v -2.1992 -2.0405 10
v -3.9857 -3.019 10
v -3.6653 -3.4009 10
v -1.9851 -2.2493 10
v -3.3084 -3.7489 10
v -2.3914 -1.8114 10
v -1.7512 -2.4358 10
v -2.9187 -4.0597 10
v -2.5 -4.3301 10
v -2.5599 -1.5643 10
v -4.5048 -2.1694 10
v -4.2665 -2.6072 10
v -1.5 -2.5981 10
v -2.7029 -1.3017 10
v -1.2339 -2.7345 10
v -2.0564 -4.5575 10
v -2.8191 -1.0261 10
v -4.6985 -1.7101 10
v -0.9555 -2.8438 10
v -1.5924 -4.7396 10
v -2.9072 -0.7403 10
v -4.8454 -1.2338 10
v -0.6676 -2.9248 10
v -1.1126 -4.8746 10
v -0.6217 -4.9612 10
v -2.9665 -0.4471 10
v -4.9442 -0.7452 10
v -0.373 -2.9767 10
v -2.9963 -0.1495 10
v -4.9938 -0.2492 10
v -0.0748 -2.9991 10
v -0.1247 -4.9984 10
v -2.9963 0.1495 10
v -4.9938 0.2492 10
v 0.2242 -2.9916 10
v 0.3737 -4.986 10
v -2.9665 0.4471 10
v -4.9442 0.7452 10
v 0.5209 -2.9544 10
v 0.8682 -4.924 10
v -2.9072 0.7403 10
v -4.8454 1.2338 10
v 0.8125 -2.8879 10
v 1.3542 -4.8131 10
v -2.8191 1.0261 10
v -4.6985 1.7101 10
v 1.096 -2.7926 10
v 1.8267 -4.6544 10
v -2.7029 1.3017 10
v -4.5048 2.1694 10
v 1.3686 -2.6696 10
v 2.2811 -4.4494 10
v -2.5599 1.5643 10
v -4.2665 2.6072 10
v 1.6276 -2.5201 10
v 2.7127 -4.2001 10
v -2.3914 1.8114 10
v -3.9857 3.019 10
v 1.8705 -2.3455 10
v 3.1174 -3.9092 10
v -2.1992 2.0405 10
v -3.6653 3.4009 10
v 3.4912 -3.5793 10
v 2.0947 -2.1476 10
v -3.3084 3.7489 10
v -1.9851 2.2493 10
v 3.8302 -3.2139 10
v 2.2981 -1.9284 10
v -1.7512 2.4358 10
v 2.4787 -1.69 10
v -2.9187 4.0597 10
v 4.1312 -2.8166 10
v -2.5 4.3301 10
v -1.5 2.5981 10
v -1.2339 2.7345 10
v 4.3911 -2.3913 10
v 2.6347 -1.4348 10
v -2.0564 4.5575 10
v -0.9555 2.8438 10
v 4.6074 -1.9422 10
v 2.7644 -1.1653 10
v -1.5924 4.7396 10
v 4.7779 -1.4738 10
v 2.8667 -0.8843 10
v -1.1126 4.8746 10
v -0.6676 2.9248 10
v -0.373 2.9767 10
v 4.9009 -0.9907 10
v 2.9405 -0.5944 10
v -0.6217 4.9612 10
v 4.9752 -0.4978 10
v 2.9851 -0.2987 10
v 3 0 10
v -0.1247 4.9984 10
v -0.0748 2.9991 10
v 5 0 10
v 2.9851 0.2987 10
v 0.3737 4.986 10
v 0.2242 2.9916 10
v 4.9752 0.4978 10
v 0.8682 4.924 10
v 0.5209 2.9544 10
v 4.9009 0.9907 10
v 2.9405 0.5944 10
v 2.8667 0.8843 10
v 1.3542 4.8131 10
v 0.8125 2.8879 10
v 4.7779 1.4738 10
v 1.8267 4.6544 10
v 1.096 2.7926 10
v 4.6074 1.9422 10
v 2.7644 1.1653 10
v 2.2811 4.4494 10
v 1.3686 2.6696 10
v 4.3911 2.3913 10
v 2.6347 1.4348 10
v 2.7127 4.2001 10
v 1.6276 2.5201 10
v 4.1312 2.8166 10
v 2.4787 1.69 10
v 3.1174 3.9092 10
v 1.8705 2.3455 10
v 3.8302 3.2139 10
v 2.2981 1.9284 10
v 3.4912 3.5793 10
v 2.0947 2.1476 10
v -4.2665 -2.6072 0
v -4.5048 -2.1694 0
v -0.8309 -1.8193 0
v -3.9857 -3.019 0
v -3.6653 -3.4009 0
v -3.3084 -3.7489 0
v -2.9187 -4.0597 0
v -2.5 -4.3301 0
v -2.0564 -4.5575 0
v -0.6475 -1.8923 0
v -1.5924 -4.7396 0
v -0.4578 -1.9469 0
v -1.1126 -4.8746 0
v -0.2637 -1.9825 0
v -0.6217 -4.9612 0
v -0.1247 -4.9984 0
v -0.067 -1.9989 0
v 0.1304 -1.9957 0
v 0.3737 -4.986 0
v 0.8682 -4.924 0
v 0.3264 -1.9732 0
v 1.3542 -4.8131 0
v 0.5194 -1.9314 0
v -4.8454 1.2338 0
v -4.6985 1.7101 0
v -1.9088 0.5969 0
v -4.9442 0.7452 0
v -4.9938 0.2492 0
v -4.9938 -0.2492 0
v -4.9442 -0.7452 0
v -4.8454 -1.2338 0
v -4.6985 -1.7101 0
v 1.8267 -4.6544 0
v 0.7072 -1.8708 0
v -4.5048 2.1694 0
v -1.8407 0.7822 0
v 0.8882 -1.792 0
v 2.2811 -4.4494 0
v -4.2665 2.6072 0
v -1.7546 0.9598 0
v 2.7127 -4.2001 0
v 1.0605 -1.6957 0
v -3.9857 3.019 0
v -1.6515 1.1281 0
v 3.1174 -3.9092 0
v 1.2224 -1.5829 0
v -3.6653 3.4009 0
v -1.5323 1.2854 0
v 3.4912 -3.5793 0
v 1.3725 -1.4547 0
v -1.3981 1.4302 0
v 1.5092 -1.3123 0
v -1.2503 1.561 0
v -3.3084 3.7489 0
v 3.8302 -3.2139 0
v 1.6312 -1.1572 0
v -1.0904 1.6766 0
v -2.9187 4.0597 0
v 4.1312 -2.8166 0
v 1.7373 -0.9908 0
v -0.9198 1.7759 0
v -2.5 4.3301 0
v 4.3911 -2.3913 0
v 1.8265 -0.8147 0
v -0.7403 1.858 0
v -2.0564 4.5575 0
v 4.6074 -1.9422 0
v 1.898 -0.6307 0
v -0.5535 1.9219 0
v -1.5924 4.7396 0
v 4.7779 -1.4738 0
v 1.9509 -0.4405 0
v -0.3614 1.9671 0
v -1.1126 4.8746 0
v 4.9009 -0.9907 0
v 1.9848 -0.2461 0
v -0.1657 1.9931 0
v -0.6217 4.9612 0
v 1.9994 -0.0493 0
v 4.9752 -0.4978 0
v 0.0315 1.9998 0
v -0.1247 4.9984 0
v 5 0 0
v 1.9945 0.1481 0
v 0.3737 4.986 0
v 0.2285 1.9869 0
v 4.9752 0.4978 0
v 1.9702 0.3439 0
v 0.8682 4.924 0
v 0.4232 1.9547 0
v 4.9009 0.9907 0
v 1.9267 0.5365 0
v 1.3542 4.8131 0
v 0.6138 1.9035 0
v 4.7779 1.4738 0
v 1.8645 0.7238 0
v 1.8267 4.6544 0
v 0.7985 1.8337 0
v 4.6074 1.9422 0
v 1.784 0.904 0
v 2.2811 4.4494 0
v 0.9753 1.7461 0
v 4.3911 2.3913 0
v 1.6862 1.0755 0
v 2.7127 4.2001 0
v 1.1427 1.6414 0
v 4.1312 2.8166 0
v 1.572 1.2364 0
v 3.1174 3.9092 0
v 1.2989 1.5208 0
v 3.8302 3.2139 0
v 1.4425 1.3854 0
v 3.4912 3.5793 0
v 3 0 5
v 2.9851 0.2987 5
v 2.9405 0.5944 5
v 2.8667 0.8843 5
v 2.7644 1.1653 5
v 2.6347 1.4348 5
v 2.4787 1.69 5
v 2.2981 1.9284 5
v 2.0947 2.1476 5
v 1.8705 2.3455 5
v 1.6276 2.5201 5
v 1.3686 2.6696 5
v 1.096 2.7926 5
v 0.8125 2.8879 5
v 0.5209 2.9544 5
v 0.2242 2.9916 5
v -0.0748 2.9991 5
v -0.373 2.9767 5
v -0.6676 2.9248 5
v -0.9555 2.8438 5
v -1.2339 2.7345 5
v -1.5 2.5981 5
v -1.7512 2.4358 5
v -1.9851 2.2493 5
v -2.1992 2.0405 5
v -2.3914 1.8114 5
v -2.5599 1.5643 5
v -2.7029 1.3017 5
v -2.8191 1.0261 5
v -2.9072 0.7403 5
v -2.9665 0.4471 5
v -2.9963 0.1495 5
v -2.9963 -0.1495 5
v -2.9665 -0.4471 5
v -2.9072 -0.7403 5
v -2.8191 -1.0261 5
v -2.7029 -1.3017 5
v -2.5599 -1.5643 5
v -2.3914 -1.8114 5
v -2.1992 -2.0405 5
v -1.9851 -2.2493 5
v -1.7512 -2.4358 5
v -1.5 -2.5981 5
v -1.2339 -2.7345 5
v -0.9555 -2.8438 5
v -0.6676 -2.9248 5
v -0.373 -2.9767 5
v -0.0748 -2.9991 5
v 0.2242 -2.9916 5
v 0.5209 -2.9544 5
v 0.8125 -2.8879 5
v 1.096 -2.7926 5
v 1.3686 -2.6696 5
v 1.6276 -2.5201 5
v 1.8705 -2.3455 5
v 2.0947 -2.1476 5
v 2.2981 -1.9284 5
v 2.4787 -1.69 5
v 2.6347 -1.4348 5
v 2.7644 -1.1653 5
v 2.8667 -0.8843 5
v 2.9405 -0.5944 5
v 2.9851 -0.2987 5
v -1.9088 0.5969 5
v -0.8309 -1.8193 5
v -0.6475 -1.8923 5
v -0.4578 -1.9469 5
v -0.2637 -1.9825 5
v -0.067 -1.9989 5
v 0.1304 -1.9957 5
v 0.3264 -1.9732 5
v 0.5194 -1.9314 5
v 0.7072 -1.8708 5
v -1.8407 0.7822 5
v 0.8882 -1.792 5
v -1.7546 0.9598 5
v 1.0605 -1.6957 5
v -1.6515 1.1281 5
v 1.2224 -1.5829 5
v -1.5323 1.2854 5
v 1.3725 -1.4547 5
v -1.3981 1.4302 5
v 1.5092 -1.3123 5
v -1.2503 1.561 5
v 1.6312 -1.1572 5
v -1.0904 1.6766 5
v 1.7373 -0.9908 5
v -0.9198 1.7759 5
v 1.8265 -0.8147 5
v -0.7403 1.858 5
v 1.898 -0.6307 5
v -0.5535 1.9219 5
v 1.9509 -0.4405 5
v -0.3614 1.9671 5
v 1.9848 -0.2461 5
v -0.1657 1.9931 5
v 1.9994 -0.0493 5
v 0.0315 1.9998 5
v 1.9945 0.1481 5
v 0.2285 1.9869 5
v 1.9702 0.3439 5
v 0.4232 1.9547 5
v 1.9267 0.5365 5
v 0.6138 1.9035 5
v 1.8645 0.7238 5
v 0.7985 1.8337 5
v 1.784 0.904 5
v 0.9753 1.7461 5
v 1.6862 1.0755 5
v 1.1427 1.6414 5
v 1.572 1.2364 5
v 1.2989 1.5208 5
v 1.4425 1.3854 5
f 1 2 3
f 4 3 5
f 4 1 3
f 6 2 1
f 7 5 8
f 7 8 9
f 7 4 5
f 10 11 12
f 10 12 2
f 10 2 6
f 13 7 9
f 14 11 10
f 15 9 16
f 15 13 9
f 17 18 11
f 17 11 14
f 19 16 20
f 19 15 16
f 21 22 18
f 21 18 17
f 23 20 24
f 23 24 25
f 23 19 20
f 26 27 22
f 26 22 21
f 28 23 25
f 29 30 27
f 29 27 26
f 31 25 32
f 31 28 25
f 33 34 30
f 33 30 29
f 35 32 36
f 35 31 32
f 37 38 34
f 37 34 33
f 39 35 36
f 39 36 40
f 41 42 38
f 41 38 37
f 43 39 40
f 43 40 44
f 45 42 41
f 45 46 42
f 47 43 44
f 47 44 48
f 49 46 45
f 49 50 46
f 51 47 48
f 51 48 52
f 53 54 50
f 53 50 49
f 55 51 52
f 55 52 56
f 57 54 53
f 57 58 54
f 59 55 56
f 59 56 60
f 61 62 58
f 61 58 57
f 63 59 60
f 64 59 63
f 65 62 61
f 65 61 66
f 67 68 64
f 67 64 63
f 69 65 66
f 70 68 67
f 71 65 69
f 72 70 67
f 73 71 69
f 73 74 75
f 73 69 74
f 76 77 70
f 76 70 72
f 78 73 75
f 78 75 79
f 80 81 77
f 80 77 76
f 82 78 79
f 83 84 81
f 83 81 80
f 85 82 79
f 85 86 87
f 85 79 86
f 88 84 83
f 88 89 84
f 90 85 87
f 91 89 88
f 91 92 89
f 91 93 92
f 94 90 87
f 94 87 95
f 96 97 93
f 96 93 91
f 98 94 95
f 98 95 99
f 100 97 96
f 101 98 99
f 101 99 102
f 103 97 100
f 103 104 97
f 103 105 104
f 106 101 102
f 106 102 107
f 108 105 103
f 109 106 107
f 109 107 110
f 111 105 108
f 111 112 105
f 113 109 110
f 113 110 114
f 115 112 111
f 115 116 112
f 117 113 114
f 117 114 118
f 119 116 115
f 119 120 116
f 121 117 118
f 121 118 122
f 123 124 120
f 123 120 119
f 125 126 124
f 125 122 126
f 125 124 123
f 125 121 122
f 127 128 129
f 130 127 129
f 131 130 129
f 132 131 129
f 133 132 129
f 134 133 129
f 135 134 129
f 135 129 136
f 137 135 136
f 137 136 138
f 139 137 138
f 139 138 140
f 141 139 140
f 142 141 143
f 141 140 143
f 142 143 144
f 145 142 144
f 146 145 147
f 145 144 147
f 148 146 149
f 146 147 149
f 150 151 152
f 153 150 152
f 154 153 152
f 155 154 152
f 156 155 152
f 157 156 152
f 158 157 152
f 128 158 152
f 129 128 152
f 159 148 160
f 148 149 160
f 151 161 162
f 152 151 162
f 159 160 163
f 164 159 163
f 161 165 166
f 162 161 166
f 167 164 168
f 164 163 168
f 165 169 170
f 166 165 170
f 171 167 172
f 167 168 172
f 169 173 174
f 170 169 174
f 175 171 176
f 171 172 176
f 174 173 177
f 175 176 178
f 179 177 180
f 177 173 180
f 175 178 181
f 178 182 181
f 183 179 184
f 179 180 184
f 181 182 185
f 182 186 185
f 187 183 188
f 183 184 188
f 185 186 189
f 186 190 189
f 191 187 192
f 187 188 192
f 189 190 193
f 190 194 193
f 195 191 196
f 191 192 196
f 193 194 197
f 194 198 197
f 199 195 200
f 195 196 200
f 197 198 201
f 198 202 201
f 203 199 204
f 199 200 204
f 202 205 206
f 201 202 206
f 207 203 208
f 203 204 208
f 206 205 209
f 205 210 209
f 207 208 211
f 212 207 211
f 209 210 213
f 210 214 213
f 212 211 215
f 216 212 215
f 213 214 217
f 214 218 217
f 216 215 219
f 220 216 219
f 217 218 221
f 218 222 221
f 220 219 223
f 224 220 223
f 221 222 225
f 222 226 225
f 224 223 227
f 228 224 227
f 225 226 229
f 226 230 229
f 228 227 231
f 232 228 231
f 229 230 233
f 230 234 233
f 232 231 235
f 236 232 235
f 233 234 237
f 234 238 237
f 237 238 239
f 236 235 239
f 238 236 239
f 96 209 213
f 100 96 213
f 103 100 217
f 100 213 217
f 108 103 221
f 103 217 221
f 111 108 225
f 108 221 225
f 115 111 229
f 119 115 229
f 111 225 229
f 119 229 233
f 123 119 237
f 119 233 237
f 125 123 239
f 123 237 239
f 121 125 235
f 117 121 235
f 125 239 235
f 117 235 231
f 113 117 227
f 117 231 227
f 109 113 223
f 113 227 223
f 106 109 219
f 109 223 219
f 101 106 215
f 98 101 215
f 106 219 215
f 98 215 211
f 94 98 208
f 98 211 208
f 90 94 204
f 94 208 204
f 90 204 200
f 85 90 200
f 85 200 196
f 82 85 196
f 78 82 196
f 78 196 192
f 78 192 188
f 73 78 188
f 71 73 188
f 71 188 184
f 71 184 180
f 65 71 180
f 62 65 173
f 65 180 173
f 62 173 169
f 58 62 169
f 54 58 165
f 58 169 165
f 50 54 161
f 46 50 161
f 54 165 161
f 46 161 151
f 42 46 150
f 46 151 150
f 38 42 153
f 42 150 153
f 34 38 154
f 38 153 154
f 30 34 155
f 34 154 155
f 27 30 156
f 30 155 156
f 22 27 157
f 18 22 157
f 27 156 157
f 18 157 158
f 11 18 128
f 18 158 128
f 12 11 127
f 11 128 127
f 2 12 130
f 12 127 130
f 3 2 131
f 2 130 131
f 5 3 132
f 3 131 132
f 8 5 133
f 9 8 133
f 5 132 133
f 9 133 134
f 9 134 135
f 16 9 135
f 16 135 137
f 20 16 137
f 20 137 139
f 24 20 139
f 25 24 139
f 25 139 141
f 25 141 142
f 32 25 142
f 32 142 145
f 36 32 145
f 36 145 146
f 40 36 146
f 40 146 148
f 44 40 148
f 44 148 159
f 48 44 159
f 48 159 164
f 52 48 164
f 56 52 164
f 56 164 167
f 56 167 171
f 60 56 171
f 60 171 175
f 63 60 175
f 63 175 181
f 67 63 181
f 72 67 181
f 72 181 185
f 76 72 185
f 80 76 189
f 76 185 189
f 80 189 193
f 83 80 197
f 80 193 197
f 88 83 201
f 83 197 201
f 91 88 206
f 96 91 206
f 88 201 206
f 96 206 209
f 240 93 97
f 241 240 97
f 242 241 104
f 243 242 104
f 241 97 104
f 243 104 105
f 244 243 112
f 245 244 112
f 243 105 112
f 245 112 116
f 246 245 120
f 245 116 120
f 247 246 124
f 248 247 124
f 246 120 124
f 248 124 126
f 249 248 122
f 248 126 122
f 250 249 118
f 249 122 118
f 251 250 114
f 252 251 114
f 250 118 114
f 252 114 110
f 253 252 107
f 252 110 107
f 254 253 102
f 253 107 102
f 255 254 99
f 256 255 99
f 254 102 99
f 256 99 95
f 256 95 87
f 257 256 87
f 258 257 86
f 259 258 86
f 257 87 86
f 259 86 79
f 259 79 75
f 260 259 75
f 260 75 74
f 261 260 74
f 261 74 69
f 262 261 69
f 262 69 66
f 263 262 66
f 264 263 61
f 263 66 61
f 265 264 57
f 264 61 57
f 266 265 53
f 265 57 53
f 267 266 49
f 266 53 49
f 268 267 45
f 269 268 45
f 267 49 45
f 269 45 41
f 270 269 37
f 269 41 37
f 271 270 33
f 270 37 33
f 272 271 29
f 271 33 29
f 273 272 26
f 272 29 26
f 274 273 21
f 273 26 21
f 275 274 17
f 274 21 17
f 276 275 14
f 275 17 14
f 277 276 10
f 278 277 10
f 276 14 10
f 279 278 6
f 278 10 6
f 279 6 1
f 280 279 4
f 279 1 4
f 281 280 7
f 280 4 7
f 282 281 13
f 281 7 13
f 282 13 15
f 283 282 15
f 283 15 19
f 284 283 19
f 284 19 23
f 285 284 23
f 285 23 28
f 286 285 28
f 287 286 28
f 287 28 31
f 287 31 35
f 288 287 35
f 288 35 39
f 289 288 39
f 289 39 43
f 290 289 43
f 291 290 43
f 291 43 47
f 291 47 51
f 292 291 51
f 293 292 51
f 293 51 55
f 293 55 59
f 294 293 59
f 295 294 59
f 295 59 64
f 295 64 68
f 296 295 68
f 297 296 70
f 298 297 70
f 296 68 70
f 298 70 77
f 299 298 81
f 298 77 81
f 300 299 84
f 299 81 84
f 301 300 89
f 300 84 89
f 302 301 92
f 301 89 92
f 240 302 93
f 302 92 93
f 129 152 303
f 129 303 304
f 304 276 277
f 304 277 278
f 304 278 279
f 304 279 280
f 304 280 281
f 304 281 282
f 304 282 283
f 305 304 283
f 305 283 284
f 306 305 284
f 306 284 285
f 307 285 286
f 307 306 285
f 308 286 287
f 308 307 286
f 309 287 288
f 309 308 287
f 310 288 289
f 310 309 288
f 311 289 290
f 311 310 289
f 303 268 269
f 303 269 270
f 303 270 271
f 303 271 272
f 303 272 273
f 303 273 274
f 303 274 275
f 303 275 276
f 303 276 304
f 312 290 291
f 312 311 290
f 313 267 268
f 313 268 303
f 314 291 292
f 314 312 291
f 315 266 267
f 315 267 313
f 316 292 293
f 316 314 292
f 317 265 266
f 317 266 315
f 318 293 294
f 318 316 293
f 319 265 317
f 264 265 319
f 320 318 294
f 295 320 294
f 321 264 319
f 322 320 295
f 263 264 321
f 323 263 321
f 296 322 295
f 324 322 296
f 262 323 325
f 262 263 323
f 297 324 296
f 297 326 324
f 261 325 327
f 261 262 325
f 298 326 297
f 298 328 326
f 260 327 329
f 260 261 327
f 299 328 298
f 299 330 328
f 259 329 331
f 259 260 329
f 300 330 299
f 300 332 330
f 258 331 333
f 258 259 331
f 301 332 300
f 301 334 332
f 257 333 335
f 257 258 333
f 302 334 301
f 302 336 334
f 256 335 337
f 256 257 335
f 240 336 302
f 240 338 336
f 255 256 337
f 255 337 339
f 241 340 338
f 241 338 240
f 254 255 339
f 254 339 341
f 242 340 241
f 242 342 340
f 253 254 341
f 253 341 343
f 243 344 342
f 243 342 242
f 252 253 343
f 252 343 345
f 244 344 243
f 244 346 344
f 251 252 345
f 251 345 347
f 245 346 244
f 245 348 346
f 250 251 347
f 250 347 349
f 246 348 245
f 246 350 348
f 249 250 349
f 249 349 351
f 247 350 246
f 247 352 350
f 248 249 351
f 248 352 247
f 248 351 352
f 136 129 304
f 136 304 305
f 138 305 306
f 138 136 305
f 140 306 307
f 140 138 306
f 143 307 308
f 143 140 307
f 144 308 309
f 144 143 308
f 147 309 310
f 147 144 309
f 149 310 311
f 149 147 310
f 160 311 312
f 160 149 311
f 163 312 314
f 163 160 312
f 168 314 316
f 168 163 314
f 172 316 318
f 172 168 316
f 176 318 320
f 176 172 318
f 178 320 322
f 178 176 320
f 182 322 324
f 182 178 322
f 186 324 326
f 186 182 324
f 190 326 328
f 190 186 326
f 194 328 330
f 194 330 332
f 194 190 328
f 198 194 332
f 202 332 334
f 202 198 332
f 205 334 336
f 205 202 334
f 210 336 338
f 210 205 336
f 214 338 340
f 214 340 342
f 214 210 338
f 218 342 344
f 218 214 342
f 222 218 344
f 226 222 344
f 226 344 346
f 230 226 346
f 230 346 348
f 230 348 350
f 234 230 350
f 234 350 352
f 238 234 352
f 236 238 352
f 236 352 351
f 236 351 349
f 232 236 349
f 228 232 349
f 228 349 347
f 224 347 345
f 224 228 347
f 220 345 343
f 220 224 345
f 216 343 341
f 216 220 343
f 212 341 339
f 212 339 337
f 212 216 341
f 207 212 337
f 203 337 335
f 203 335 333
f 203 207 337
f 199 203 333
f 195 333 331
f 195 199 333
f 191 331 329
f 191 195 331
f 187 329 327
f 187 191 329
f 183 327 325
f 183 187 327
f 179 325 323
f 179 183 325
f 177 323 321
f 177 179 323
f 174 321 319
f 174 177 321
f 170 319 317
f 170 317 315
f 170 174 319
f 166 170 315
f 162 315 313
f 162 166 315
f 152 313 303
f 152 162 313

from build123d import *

# Parameters (mm, degrees)
SKETCH2_R           = 5
BOSS_EXTRUDE1_DEPTH = 10
CUT_EXTRUDE1_DEPTH  = 5
SKETCH4_R           = 3
CUT_EXTRUDE2_DEPTH  = 5


with BuildPart() as part:
    # Sketch2 → Boss-Extrude1 (new body)
    with BuildSketch(Plane.XY):
        Circle(SKETCH2_R)
    extrude(amount=BOSS_EXTRUDE1_DEPTH)

    # Sketch3 → Cut-Extrude1 (cut)
    with BuildSketch(Plane(origin=(0, 0, 0), x_dir=(-1, 0, 0), z_dir=(0, 0, -1))):
        with BuildLine():
            Line((1.908838778, 0.596937618), (0.830860529, -1.81925006))
            ThreePointArc((0.830860529, -1.81925006), (-1.826466205, 0.814874961), (1.908838778, 0.596937618))
        make_face()
    extrude(amount=-CUT_EXTRUDE1_DEPTH, mode=Mode.SUBTRACT)

    # Sketch4 → Cut-Extrude2 (cut)
    with BuildSketch(Plane.XY.offset(10)):
        Circle(SKETCH4_R)
    extrude(amount=-CUT_EXTRUDE2_DEPTH, mode=Mode.SUBTRACT)


solid = part.part
